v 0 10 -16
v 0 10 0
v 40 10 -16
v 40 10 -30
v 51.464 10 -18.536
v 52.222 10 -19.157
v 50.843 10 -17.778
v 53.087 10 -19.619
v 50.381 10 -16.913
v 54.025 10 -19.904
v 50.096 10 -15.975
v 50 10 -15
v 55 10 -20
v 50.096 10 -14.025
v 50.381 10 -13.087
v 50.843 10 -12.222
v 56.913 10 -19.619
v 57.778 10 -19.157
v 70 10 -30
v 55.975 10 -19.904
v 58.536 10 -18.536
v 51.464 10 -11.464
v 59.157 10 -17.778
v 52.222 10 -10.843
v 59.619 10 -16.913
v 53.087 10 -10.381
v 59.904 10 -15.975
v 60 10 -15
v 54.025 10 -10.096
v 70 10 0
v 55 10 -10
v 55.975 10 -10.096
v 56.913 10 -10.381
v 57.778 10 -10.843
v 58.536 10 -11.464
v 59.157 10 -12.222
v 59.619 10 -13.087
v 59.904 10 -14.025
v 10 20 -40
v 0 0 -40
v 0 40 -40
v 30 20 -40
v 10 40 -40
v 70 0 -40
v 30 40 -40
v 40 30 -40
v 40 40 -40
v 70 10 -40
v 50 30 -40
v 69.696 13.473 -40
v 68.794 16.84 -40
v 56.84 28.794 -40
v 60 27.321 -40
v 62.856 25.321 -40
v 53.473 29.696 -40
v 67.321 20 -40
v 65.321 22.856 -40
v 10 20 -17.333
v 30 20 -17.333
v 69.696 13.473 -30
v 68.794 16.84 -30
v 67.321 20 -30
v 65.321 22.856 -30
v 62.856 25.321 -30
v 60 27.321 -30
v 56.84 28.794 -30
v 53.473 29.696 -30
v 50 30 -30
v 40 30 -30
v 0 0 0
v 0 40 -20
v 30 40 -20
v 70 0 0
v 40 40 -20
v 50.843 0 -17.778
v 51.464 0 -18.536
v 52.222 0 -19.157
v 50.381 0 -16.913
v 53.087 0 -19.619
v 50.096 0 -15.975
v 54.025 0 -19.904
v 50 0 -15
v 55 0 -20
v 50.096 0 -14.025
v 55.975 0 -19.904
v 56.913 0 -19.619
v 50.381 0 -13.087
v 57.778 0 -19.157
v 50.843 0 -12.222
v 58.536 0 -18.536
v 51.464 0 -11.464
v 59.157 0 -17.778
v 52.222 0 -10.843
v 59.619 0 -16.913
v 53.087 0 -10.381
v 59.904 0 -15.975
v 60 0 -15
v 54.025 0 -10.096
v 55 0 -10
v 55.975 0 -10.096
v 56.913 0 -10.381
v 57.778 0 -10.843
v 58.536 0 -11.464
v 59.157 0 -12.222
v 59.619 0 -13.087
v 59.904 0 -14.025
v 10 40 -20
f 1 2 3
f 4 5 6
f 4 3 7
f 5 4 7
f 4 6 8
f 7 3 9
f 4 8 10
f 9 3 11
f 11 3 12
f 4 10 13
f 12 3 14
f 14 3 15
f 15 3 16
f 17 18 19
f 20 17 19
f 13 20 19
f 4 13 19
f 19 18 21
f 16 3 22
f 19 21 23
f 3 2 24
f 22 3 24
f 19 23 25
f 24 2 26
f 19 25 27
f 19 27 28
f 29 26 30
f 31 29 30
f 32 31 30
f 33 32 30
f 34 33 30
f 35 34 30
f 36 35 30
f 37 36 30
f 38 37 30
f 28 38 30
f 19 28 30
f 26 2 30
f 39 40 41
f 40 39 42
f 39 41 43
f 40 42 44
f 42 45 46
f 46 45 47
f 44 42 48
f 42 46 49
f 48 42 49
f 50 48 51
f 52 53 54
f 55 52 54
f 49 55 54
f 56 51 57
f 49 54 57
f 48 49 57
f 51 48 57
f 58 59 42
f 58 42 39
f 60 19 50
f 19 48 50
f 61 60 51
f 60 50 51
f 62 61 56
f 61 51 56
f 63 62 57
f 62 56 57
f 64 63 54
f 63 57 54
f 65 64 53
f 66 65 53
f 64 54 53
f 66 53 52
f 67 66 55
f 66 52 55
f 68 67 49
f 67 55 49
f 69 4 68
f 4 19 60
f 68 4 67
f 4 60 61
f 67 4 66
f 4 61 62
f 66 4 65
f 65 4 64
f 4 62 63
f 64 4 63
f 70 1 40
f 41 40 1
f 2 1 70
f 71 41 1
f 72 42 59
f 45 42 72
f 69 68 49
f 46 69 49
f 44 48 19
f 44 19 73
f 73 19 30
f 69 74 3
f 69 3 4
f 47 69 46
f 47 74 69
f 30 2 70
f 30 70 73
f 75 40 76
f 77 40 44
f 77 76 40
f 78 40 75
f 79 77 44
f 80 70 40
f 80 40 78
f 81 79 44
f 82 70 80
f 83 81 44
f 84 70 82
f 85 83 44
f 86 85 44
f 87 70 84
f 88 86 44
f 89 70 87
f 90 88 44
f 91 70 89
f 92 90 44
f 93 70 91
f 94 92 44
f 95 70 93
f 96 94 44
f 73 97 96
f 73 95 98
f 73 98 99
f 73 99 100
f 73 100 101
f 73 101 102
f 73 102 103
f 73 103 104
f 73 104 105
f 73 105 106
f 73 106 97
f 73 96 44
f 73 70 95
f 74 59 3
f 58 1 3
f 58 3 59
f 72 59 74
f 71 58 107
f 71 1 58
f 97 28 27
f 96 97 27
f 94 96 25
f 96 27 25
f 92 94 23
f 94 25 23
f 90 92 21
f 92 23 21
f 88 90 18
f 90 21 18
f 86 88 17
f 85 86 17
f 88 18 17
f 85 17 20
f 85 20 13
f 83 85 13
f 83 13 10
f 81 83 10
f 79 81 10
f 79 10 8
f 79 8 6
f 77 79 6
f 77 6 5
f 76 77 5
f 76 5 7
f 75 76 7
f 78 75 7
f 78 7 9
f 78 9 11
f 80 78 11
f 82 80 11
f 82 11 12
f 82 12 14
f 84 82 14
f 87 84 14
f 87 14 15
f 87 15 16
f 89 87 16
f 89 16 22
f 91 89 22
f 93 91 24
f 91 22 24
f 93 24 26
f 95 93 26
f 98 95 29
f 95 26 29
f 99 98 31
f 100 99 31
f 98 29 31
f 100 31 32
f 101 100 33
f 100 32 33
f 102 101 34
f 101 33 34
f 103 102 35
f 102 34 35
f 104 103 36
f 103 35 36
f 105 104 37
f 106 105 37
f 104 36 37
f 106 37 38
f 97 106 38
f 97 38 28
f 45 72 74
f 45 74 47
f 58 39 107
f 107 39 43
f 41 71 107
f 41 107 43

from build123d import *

# Parameters (mm, degrees)
BOSS_EXTRUDE1_DEPTH            = 40
SKETCH2_W                      = 40
SKETCH2_H                      = 30
BOSS_EXTRUDE2_DEPTH            = 20
BOSS_EXTRUDE3_DEPTH            = 30
CUT_EXTRUDE1_DEPTH             = 30
SKETCH5_W                      = 70
SKETCH5_H                      = 40
BOSS_EXTRUDE4_DEPTH            = 10
SKETCH6_W                      = 20
SKETCH6_H                      = 20
CUT_EXTRUDE2_DEPTH             = 41
F_10_0_10_DIAMETER_HOLE1_D     = 10
F_10_0_10_DIAMETER_HOLE1_DEPTH = 40
FILLET1_R                      = 20


with BuildPart() as part:
    # Sketch1 → Boss-Extrude1 (new body)
    with BuildSketch(Plane(origin=(0, 0, 0), x_dir=(0, -1, 0), z_dir=(-1, 0, 0))):
        Polygon((-10, -16), (-40, -20), (-10, -20), align=None)
    extrude(amount=-BOSS_EXTRUDE1_DEPTH)

    # Sketch2 → Boss-Extrude2 (add)
    with BuildSketch(Plane(origin=(0, 0, -20), x_dir=(-1, 0, 0), z_dir=(0, 0, -1))):
        with Locations((-20, 25)):
            Rectangle(SKETCH2_W, SKETCH2_H)
    extrude(amount=BOSS_EXTRUDE2_DEPTH)

    # Sketch3 → Boss-Extrude3 (add)
    with BuildSketch(Plane(origin=(40, 0, 0), x_dir=(0, 0, -1), z_dir=(1, 0, 0))):
        Polygon((40, 10), (0, 10), (20, 40), (40, 40), align=None)
    extrude(amount=BOSS_EXTRUDE3_DEPTH)

    # Sketch4 → Cut-Extrude1 (cut)
    with BuildSketch(Plane(origin=(70, 0, 0), x_dir=(0, 0, -1), z_dir=(1, 0, 0))):
        Polygon((20, 40), (0, 10), (30, 10), (30, 30), (40, 30), (40, 40), align=None)
    extrude(amount=-CUT_EXTRUDE1_DEPTH, mode=Mode.SUBTRACT)

    # Sketch5 → Boss-Extrude4 (add)
    with BuildSketch(Plane.XZ.offset(-10)):
        with Locations((35, -20)):
            Rectangle(SKETCH5_W, SKETCH5_H)
    extrude(amount=BOSS_EXTRUDE4_DEPTH)

    # Sketch6 → Cut-Extrude2 (cut, through all)
    with BuildSketch(Plane(origin=(0, 0, -40), x_dir=(-1, 0, 0), z_dir=(0, 0, -1))):
        with Locations((-20, 30)):
            Rectangle(SKETCH6_W, SKETCH6_H)
    extrude(amount=-CUT_EXTRUDE2_DEPTH, mode=Mode.SUBTRACT)

    # Ø10.0 (10) Diameter Hole1
    with Locations(Plane(origin=(0, 0, 0), x_dir=(-1, 0, 0), z_dir=(0, -1, 0))):
        with Locations((-55, 15)):
            Hole(F_10_0_10_DIAMETER_HOLE1_D / 2, depth=F_10_0_10_DIAMETER_HOLE1_DEPTH)

    # Fillet1
    fillet1_edges = [part.edges().sort_by_distance(p)[0] for p in [
        (70, 30, -35),
    ]]
    fillet(fillet1_edges, radius=FILLET1_R)


solid = part.part
